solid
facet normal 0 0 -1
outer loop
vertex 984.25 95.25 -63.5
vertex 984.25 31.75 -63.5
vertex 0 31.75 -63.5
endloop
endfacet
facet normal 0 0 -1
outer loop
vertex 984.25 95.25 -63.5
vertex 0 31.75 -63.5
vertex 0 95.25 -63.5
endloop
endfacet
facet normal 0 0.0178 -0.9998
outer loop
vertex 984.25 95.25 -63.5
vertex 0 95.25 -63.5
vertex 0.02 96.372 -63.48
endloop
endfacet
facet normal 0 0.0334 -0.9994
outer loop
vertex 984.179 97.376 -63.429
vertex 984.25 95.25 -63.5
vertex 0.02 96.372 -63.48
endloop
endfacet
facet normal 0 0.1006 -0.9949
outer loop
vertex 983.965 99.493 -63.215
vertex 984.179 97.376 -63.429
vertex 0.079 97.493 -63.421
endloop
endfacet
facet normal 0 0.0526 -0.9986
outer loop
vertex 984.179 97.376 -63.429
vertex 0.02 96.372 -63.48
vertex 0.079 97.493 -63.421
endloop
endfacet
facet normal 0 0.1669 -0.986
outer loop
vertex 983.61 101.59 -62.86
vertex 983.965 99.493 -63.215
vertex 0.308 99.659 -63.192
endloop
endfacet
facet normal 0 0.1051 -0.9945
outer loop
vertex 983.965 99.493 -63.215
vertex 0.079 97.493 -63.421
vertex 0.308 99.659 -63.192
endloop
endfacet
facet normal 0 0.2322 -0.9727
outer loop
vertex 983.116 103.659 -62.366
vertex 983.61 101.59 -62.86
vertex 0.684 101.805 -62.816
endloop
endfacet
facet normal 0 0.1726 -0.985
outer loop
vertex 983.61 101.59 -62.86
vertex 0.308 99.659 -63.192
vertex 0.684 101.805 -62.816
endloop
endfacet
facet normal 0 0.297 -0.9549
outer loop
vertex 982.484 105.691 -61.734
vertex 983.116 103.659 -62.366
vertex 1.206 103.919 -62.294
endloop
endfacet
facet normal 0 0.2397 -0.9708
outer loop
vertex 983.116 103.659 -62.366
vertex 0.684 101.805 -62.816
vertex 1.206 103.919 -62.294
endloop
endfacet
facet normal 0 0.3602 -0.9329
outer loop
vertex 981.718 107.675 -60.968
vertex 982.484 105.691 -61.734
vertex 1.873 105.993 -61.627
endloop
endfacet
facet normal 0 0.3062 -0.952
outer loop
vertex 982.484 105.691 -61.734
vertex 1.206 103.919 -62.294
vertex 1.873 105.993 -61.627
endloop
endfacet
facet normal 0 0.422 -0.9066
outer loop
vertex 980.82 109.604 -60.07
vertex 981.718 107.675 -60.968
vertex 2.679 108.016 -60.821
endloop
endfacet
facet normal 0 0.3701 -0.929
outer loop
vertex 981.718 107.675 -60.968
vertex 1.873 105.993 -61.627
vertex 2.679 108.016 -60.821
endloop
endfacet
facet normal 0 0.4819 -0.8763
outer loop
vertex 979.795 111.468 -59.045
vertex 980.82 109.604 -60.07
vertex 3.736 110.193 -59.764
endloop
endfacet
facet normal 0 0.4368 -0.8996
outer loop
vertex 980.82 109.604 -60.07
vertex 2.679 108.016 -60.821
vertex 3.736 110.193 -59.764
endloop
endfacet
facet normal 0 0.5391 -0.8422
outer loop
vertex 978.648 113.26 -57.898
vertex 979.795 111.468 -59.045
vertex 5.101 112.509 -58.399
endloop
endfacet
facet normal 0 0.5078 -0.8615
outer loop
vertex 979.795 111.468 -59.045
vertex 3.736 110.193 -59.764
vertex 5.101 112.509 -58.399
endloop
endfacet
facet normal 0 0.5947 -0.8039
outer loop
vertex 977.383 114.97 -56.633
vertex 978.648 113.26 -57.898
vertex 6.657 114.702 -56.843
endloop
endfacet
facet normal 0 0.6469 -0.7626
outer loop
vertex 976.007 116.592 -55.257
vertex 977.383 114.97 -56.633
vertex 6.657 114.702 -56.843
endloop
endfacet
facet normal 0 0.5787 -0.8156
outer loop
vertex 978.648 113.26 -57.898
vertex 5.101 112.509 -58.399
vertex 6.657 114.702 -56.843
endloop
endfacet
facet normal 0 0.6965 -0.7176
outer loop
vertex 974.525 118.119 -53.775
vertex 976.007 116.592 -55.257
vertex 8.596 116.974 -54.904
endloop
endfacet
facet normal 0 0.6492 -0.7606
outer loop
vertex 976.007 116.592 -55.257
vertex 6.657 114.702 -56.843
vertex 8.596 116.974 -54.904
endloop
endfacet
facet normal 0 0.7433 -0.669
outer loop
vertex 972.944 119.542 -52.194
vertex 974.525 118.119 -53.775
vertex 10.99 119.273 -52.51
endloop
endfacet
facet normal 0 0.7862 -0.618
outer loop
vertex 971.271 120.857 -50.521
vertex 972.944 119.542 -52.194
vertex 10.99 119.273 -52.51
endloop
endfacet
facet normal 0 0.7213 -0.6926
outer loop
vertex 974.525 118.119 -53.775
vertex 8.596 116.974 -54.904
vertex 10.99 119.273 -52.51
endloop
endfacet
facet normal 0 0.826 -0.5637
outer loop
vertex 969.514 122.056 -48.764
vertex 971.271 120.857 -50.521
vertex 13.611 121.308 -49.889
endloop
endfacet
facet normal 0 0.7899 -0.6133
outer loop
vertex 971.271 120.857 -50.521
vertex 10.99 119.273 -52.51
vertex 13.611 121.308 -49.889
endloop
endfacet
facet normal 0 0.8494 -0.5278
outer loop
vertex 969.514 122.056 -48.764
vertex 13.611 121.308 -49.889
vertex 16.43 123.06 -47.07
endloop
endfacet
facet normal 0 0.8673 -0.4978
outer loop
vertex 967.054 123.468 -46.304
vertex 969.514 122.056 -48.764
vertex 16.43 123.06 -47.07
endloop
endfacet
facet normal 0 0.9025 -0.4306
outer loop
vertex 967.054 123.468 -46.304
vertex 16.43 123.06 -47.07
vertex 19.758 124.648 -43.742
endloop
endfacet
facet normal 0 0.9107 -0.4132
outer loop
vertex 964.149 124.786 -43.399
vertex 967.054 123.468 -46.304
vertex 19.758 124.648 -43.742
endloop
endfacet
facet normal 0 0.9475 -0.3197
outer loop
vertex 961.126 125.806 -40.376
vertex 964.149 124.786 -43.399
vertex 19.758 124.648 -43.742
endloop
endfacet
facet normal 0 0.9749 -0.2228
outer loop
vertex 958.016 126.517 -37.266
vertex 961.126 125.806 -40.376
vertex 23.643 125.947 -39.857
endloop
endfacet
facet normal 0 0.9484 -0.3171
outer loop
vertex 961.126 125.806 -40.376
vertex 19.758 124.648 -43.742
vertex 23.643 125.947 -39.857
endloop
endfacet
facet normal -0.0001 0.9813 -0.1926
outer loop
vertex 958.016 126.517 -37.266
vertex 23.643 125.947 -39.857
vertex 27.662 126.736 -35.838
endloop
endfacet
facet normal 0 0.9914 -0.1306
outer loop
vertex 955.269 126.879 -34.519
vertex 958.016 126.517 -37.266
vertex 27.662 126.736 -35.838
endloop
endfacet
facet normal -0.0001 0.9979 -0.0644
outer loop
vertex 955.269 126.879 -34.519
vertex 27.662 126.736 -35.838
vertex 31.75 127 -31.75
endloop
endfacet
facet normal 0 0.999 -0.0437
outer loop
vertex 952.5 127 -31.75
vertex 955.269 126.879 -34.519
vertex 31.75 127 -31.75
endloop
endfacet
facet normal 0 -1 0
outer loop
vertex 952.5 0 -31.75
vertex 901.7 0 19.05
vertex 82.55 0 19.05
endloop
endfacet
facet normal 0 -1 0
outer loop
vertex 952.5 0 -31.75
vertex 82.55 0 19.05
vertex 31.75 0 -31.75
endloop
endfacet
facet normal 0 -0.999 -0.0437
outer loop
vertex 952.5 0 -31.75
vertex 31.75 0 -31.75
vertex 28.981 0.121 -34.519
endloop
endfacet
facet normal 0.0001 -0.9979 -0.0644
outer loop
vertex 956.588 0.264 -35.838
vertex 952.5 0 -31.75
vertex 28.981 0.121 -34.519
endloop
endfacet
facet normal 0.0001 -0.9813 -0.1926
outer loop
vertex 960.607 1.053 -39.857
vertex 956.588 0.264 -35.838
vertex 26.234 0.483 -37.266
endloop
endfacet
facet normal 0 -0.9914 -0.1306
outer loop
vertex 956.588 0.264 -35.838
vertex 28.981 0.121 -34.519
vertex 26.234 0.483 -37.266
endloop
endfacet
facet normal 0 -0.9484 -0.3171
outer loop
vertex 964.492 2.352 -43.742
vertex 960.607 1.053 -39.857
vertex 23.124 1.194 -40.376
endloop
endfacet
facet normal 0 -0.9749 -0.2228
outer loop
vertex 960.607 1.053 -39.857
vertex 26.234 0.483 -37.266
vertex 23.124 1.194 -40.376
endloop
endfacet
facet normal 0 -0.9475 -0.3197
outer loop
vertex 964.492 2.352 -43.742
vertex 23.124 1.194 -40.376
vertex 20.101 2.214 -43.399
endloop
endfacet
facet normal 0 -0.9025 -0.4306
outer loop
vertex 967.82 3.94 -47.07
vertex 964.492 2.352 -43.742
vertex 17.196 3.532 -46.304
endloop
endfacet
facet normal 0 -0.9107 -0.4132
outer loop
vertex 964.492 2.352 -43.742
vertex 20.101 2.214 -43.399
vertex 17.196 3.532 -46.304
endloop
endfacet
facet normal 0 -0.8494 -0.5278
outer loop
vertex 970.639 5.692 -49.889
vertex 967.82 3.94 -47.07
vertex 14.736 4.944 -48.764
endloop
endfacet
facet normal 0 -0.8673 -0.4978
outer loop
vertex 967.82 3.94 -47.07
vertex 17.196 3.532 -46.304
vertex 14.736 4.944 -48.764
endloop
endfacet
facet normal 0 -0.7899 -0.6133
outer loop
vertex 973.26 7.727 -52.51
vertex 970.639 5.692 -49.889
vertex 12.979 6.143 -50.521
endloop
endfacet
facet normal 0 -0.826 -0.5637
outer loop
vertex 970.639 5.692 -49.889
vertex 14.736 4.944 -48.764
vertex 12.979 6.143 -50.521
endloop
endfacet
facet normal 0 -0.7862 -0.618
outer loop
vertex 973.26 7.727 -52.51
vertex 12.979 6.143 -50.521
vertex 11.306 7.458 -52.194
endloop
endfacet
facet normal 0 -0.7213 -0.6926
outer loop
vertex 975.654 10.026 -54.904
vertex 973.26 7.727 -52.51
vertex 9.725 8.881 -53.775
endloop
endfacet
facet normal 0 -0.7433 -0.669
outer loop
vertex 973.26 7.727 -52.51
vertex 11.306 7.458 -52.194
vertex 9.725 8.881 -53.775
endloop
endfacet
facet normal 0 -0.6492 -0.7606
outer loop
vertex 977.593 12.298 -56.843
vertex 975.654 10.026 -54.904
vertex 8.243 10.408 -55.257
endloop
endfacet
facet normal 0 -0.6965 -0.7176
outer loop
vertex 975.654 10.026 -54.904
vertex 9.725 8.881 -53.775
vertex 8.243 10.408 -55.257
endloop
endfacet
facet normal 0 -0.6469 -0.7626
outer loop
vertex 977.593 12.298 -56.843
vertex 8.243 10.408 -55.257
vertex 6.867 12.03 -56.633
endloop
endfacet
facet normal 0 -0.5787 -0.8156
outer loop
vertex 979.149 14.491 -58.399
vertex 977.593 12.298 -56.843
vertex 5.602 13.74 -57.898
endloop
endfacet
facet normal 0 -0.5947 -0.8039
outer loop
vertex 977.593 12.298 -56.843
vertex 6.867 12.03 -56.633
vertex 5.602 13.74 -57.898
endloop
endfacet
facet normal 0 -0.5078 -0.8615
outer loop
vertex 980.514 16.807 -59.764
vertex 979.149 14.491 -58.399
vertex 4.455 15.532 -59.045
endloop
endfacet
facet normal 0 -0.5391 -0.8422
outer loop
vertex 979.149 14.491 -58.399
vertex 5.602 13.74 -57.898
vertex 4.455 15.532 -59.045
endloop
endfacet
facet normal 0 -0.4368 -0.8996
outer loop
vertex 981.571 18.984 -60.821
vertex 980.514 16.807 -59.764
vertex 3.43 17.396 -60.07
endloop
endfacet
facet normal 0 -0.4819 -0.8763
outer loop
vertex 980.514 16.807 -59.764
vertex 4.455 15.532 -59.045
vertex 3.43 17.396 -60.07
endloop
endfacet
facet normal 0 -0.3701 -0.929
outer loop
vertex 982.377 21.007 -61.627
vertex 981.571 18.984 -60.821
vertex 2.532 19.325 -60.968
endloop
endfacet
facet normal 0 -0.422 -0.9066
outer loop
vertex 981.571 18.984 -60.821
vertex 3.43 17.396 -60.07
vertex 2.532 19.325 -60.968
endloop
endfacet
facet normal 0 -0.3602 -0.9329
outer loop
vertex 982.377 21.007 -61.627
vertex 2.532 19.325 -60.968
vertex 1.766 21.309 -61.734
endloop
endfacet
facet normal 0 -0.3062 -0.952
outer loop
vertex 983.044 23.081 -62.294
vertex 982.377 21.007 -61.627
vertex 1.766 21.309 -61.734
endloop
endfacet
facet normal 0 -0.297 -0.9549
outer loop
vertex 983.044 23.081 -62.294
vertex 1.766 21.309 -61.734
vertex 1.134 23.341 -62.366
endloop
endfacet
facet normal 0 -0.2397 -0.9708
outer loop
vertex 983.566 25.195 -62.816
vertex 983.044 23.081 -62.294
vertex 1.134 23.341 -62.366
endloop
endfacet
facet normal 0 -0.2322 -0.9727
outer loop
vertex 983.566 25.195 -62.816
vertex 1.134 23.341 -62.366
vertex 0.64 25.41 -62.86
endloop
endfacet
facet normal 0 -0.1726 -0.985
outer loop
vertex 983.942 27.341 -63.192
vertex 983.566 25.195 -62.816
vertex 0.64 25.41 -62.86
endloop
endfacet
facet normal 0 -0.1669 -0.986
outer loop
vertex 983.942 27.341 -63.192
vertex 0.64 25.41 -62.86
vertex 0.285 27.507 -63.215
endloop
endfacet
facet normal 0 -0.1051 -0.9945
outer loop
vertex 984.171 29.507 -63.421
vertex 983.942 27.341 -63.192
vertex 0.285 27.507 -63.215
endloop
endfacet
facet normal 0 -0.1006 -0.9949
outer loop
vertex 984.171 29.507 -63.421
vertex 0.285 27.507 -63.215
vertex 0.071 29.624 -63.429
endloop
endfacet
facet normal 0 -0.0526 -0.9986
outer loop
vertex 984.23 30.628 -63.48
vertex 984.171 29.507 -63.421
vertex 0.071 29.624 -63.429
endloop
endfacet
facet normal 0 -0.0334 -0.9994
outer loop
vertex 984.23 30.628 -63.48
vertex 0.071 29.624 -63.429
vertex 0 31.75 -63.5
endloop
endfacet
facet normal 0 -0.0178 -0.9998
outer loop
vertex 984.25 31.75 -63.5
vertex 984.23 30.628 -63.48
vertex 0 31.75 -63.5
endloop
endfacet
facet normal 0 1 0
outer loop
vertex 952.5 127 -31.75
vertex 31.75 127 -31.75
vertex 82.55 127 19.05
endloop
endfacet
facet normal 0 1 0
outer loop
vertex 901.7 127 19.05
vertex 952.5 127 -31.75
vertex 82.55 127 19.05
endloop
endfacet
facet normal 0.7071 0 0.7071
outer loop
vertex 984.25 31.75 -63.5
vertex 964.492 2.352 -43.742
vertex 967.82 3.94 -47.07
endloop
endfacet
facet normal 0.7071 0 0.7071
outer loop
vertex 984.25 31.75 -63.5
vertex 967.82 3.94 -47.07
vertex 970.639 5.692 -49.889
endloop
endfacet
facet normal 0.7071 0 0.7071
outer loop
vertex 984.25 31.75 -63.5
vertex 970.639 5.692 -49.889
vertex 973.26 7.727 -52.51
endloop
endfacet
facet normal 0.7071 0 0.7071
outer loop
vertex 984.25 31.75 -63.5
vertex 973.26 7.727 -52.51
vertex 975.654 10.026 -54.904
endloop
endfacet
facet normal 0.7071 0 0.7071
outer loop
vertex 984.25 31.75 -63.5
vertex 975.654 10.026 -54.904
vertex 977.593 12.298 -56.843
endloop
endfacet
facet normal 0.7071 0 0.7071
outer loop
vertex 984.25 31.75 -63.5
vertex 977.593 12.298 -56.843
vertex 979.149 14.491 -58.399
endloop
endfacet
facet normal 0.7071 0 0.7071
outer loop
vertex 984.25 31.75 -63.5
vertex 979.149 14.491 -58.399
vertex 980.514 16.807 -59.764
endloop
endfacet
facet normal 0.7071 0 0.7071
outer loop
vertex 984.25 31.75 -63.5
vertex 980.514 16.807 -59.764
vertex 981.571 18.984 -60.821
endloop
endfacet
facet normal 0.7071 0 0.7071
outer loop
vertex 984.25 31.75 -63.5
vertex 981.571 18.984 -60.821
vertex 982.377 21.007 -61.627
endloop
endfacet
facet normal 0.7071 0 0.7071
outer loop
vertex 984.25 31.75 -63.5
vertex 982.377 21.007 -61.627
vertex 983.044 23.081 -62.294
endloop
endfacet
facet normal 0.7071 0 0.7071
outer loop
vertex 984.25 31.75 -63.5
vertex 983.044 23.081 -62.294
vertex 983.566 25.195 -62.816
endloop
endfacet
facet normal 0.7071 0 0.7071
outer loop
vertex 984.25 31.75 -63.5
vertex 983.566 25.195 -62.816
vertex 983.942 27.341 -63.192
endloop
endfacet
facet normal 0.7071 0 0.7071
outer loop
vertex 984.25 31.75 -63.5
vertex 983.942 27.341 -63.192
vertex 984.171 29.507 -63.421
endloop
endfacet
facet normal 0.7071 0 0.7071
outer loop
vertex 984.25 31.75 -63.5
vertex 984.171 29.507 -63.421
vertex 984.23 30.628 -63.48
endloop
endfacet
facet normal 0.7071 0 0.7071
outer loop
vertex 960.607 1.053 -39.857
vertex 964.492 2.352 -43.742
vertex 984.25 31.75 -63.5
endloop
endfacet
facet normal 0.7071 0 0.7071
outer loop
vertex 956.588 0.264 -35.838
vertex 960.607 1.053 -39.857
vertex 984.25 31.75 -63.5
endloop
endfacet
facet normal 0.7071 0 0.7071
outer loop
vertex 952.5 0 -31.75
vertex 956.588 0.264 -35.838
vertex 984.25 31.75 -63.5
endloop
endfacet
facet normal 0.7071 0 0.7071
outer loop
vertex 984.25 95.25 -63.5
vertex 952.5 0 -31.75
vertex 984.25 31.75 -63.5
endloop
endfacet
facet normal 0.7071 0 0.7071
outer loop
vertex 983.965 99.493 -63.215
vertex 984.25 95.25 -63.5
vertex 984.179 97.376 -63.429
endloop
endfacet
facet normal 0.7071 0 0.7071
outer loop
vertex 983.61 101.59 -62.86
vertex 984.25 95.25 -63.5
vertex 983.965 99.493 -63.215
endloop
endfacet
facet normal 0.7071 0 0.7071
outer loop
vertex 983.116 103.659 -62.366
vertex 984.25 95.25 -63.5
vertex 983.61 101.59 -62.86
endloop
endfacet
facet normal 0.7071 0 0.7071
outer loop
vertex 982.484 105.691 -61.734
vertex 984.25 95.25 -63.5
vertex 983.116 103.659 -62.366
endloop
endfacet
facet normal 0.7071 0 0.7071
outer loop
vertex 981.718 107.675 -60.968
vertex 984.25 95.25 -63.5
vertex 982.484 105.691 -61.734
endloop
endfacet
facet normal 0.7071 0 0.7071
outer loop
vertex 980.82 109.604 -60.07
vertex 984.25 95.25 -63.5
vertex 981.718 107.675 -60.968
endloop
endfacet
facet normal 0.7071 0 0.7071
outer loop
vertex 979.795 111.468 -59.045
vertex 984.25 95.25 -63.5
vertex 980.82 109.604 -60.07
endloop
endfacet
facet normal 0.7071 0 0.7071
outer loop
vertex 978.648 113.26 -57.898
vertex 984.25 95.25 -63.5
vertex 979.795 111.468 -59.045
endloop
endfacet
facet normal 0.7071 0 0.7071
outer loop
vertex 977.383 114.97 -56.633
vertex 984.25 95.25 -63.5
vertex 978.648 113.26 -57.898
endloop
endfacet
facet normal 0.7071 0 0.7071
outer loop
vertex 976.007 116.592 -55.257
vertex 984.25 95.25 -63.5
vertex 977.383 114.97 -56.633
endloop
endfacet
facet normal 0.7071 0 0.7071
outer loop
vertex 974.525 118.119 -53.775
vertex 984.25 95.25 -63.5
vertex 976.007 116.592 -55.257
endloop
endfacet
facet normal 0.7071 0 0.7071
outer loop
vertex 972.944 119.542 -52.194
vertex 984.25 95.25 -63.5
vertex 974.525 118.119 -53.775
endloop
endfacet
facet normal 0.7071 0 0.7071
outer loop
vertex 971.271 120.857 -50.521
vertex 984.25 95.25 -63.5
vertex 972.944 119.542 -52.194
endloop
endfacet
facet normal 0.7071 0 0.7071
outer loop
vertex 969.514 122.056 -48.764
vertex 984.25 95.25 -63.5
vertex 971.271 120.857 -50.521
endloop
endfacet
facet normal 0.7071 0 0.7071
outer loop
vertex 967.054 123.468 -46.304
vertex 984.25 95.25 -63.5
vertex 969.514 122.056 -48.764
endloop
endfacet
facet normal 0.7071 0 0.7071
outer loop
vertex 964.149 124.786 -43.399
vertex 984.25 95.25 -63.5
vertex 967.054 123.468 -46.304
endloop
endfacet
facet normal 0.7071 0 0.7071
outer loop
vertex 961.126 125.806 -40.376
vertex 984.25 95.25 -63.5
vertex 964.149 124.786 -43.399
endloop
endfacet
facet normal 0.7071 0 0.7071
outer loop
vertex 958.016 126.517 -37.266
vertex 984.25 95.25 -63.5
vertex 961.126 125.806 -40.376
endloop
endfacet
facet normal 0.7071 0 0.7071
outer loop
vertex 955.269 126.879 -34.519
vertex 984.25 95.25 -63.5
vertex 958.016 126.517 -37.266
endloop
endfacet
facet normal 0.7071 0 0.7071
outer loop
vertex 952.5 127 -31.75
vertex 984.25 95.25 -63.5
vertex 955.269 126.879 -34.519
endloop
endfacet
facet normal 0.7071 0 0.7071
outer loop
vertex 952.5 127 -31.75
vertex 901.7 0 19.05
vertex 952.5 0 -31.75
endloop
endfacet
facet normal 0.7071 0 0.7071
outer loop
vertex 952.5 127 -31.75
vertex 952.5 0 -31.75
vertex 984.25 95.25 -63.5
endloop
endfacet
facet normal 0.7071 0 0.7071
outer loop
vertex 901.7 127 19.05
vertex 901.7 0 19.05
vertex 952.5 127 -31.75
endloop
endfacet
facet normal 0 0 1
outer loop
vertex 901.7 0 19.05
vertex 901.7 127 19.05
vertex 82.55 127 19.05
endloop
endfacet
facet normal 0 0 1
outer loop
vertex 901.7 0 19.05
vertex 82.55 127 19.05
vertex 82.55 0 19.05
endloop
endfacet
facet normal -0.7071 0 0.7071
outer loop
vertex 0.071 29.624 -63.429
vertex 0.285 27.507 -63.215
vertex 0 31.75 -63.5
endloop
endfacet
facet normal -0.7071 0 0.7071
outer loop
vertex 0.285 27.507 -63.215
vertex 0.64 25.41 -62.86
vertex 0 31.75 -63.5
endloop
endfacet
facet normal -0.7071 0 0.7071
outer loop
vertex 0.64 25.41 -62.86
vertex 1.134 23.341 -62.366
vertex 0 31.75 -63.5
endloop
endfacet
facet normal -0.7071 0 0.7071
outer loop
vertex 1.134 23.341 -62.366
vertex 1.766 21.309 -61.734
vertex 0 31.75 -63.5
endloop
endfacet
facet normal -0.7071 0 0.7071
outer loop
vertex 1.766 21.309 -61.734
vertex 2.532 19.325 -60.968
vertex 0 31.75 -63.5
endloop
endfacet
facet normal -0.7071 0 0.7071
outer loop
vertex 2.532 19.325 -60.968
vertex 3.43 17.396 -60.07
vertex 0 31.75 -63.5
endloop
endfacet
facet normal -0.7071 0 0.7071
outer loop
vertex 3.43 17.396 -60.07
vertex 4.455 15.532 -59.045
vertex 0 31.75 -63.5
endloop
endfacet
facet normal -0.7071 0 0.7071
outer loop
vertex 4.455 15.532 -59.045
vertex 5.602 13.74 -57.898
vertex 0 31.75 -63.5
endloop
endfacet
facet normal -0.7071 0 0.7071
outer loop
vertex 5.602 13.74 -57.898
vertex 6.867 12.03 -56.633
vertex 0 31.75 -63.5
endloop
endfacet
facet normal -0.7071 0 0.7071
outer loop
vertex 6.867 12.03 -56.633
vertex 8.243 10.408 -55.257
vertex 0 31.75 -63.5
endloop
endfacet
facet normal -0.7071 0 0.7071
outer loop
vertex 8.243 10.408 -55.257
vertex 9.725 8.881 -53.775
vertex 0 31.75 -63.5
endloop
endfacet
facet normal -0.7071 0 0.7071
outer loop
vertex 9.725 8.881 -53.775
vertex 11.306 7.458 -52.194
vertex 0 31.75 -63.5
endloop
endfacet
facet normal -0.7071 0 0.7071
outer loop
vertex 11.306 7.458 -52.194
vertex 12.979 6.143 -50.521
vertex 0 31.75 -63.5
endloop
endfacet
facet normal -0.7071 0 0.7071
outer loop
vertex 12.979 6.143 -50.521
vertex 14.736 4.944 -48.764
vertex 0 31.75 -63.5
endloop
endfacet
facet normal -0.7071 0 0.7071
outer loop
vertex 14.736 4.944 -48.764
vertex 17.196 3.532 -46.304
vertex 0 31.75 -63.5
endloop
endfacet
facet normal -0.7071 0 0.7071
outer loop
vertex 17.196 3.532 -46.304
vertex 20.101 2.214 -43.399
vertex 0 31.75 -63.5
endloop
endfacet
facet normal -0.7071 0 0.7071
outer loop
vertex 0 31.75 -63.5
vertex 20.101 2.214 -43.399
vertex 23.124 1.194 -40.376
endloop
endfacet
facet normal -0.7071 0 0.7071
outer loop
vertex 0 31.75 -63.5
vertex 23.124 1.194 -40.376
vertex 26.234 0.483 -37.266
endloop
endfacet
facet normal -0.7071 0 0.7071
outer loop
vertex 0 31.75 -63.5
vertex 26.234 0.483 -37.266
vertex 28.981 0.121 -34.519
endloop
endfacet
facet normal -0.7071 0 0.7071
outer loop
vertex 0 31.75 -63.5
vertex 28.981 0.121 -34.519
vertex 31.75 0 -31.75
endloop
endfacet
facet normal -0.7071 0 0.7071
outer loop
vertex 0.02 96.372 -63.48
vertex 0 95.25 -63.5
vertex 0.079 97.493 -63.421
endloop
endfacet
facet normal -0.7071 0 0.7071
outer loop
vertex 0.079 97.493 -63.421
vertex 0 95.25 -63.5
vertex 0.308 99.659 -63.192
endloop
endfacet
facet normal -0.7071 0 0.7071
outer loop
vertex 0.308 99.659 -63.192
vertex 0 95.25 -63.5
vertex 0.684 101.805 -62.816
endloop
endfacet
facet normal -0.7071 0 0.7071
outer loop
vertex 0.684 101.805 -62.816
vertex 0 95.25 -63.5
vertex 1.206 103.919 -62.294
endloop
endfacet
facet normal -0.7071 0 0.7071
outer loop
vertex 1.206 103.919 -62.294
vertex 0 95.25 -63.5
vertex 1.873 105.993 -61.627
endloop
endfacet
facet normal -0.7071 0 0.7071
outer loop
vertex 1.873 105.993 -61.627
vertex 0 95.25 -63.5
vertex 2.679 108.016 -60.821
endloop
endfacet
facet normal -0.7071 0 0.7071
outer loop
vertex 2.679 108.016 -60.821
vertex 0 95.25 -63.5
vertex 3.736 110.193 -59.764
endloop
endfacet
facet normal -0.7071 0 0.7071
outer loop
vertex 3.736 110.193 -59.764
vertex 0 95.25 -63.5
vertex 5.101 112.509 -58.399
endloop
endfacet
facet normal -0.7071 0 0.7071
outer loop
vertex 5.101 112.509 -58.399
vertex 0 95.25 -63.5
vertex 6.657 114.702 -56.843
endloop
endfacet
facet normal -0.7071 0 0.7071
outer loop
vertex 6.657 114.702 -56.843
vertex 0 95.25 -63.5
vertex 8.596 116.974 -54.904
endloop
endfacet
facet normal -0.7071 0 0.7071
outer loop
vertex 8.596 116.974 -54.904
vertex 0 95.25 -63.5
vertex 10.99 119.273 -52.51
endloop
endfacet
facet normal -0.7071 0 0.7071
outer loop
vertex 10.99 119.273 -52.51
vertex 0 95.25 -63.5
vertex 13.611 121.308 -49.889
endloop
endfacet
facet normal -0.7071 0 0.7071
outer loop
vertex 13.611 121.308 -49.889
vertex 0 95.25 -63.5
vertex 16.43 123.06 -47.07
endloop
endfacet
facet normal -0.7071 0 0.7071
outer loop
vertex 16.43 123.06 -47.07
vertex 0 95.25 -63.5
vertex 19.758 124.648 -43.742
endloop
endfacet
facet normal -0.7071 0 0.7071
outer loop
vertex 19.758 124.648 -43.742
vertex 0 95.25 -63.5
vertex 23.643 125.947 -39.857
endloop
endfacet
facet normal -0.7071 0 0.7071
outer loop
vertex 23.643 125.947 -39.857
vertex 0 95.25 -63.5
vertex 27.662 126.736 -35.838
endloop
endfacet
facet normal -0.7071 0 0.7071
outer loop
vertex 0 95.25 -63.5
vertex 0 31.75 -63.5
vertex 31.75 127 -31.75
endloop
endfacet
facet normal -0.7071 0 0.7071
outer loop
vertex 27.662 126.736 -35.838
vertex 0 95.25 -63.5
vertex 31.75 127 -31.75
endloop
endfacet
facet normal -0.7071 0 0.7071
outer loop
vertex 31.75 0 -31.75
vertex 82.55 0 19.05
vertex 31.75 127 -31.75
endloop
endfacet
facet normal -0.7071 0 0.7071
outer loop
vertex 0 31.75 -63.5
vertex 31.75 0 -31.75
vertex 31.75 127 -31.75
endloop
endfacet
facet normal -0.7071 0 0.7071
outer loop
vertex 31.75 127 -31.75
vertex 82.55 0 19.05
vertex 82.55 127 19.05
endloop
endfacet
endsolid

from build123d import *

# Parameters (mm, degrees)
BOSS_EXTRUDE1_DEPTH = 984.25
SKETCH2_W           = 344.402501539
SKETCH2_H           = 493.213131915
CUT_EXTRUDE1_DEPTH  = 59.371664787


with BuildPart() as part:
    # Sketch1 → Boss-Extrude1 (new body)
    with BuildSketch(Plane(origin=(0, 0, 0), x_dir=(0, 0, -1), z_dir=(1, 0, 0))):
        with BuildLine():
            Line((0, 0), (31.75, 0))
            ThreePointArc((31.75, 0), (54.200640303, 9.299359697), (63.5, 31.75))
            Line((63.5, 31.75), (63.5, 95.25))
            ThreePointArc((63.5, 95.25), (54.200640303, 117.700640303), (31.75, 127))
            Line((31.75, 127), (0, 127))
            Line((0, 127), (-19.05, 127))
            Line((-19.05, 127), (-19.05, 0))
            Line((-19.05, 0), (0, 0))
        make_face()
    extrude(amount=BOSS_EXTRUDE1_DEPTH)

    # Sketch2 → Cut-Extrude1 (cut, through all)
    with BuildSketch(Plane(origin=(460.375, 0, 460.375), x_dir=(0, 1, 0), z_dir=(0.707106781, 0, 0.707106781))):
        with Locations((32.995160032, -679.680893327)):
            Rectangle(SKETCH2_W, SKETCH2_H)
    cut_extrude1 = extrude(amount=CUT_EXTRUDE1_DEPTH, mode=Mode.SUBTRACT)

    # Mirror1: Cut-Extrude1 across plane
    add(cut_extrude1.mirror(Plane(origin=(492.125, 0, 0), x_dir=(0, 0, 1), z_dir=(1, 0, 0))), mode=Mode.SUBTRACT)


solid = part.part
